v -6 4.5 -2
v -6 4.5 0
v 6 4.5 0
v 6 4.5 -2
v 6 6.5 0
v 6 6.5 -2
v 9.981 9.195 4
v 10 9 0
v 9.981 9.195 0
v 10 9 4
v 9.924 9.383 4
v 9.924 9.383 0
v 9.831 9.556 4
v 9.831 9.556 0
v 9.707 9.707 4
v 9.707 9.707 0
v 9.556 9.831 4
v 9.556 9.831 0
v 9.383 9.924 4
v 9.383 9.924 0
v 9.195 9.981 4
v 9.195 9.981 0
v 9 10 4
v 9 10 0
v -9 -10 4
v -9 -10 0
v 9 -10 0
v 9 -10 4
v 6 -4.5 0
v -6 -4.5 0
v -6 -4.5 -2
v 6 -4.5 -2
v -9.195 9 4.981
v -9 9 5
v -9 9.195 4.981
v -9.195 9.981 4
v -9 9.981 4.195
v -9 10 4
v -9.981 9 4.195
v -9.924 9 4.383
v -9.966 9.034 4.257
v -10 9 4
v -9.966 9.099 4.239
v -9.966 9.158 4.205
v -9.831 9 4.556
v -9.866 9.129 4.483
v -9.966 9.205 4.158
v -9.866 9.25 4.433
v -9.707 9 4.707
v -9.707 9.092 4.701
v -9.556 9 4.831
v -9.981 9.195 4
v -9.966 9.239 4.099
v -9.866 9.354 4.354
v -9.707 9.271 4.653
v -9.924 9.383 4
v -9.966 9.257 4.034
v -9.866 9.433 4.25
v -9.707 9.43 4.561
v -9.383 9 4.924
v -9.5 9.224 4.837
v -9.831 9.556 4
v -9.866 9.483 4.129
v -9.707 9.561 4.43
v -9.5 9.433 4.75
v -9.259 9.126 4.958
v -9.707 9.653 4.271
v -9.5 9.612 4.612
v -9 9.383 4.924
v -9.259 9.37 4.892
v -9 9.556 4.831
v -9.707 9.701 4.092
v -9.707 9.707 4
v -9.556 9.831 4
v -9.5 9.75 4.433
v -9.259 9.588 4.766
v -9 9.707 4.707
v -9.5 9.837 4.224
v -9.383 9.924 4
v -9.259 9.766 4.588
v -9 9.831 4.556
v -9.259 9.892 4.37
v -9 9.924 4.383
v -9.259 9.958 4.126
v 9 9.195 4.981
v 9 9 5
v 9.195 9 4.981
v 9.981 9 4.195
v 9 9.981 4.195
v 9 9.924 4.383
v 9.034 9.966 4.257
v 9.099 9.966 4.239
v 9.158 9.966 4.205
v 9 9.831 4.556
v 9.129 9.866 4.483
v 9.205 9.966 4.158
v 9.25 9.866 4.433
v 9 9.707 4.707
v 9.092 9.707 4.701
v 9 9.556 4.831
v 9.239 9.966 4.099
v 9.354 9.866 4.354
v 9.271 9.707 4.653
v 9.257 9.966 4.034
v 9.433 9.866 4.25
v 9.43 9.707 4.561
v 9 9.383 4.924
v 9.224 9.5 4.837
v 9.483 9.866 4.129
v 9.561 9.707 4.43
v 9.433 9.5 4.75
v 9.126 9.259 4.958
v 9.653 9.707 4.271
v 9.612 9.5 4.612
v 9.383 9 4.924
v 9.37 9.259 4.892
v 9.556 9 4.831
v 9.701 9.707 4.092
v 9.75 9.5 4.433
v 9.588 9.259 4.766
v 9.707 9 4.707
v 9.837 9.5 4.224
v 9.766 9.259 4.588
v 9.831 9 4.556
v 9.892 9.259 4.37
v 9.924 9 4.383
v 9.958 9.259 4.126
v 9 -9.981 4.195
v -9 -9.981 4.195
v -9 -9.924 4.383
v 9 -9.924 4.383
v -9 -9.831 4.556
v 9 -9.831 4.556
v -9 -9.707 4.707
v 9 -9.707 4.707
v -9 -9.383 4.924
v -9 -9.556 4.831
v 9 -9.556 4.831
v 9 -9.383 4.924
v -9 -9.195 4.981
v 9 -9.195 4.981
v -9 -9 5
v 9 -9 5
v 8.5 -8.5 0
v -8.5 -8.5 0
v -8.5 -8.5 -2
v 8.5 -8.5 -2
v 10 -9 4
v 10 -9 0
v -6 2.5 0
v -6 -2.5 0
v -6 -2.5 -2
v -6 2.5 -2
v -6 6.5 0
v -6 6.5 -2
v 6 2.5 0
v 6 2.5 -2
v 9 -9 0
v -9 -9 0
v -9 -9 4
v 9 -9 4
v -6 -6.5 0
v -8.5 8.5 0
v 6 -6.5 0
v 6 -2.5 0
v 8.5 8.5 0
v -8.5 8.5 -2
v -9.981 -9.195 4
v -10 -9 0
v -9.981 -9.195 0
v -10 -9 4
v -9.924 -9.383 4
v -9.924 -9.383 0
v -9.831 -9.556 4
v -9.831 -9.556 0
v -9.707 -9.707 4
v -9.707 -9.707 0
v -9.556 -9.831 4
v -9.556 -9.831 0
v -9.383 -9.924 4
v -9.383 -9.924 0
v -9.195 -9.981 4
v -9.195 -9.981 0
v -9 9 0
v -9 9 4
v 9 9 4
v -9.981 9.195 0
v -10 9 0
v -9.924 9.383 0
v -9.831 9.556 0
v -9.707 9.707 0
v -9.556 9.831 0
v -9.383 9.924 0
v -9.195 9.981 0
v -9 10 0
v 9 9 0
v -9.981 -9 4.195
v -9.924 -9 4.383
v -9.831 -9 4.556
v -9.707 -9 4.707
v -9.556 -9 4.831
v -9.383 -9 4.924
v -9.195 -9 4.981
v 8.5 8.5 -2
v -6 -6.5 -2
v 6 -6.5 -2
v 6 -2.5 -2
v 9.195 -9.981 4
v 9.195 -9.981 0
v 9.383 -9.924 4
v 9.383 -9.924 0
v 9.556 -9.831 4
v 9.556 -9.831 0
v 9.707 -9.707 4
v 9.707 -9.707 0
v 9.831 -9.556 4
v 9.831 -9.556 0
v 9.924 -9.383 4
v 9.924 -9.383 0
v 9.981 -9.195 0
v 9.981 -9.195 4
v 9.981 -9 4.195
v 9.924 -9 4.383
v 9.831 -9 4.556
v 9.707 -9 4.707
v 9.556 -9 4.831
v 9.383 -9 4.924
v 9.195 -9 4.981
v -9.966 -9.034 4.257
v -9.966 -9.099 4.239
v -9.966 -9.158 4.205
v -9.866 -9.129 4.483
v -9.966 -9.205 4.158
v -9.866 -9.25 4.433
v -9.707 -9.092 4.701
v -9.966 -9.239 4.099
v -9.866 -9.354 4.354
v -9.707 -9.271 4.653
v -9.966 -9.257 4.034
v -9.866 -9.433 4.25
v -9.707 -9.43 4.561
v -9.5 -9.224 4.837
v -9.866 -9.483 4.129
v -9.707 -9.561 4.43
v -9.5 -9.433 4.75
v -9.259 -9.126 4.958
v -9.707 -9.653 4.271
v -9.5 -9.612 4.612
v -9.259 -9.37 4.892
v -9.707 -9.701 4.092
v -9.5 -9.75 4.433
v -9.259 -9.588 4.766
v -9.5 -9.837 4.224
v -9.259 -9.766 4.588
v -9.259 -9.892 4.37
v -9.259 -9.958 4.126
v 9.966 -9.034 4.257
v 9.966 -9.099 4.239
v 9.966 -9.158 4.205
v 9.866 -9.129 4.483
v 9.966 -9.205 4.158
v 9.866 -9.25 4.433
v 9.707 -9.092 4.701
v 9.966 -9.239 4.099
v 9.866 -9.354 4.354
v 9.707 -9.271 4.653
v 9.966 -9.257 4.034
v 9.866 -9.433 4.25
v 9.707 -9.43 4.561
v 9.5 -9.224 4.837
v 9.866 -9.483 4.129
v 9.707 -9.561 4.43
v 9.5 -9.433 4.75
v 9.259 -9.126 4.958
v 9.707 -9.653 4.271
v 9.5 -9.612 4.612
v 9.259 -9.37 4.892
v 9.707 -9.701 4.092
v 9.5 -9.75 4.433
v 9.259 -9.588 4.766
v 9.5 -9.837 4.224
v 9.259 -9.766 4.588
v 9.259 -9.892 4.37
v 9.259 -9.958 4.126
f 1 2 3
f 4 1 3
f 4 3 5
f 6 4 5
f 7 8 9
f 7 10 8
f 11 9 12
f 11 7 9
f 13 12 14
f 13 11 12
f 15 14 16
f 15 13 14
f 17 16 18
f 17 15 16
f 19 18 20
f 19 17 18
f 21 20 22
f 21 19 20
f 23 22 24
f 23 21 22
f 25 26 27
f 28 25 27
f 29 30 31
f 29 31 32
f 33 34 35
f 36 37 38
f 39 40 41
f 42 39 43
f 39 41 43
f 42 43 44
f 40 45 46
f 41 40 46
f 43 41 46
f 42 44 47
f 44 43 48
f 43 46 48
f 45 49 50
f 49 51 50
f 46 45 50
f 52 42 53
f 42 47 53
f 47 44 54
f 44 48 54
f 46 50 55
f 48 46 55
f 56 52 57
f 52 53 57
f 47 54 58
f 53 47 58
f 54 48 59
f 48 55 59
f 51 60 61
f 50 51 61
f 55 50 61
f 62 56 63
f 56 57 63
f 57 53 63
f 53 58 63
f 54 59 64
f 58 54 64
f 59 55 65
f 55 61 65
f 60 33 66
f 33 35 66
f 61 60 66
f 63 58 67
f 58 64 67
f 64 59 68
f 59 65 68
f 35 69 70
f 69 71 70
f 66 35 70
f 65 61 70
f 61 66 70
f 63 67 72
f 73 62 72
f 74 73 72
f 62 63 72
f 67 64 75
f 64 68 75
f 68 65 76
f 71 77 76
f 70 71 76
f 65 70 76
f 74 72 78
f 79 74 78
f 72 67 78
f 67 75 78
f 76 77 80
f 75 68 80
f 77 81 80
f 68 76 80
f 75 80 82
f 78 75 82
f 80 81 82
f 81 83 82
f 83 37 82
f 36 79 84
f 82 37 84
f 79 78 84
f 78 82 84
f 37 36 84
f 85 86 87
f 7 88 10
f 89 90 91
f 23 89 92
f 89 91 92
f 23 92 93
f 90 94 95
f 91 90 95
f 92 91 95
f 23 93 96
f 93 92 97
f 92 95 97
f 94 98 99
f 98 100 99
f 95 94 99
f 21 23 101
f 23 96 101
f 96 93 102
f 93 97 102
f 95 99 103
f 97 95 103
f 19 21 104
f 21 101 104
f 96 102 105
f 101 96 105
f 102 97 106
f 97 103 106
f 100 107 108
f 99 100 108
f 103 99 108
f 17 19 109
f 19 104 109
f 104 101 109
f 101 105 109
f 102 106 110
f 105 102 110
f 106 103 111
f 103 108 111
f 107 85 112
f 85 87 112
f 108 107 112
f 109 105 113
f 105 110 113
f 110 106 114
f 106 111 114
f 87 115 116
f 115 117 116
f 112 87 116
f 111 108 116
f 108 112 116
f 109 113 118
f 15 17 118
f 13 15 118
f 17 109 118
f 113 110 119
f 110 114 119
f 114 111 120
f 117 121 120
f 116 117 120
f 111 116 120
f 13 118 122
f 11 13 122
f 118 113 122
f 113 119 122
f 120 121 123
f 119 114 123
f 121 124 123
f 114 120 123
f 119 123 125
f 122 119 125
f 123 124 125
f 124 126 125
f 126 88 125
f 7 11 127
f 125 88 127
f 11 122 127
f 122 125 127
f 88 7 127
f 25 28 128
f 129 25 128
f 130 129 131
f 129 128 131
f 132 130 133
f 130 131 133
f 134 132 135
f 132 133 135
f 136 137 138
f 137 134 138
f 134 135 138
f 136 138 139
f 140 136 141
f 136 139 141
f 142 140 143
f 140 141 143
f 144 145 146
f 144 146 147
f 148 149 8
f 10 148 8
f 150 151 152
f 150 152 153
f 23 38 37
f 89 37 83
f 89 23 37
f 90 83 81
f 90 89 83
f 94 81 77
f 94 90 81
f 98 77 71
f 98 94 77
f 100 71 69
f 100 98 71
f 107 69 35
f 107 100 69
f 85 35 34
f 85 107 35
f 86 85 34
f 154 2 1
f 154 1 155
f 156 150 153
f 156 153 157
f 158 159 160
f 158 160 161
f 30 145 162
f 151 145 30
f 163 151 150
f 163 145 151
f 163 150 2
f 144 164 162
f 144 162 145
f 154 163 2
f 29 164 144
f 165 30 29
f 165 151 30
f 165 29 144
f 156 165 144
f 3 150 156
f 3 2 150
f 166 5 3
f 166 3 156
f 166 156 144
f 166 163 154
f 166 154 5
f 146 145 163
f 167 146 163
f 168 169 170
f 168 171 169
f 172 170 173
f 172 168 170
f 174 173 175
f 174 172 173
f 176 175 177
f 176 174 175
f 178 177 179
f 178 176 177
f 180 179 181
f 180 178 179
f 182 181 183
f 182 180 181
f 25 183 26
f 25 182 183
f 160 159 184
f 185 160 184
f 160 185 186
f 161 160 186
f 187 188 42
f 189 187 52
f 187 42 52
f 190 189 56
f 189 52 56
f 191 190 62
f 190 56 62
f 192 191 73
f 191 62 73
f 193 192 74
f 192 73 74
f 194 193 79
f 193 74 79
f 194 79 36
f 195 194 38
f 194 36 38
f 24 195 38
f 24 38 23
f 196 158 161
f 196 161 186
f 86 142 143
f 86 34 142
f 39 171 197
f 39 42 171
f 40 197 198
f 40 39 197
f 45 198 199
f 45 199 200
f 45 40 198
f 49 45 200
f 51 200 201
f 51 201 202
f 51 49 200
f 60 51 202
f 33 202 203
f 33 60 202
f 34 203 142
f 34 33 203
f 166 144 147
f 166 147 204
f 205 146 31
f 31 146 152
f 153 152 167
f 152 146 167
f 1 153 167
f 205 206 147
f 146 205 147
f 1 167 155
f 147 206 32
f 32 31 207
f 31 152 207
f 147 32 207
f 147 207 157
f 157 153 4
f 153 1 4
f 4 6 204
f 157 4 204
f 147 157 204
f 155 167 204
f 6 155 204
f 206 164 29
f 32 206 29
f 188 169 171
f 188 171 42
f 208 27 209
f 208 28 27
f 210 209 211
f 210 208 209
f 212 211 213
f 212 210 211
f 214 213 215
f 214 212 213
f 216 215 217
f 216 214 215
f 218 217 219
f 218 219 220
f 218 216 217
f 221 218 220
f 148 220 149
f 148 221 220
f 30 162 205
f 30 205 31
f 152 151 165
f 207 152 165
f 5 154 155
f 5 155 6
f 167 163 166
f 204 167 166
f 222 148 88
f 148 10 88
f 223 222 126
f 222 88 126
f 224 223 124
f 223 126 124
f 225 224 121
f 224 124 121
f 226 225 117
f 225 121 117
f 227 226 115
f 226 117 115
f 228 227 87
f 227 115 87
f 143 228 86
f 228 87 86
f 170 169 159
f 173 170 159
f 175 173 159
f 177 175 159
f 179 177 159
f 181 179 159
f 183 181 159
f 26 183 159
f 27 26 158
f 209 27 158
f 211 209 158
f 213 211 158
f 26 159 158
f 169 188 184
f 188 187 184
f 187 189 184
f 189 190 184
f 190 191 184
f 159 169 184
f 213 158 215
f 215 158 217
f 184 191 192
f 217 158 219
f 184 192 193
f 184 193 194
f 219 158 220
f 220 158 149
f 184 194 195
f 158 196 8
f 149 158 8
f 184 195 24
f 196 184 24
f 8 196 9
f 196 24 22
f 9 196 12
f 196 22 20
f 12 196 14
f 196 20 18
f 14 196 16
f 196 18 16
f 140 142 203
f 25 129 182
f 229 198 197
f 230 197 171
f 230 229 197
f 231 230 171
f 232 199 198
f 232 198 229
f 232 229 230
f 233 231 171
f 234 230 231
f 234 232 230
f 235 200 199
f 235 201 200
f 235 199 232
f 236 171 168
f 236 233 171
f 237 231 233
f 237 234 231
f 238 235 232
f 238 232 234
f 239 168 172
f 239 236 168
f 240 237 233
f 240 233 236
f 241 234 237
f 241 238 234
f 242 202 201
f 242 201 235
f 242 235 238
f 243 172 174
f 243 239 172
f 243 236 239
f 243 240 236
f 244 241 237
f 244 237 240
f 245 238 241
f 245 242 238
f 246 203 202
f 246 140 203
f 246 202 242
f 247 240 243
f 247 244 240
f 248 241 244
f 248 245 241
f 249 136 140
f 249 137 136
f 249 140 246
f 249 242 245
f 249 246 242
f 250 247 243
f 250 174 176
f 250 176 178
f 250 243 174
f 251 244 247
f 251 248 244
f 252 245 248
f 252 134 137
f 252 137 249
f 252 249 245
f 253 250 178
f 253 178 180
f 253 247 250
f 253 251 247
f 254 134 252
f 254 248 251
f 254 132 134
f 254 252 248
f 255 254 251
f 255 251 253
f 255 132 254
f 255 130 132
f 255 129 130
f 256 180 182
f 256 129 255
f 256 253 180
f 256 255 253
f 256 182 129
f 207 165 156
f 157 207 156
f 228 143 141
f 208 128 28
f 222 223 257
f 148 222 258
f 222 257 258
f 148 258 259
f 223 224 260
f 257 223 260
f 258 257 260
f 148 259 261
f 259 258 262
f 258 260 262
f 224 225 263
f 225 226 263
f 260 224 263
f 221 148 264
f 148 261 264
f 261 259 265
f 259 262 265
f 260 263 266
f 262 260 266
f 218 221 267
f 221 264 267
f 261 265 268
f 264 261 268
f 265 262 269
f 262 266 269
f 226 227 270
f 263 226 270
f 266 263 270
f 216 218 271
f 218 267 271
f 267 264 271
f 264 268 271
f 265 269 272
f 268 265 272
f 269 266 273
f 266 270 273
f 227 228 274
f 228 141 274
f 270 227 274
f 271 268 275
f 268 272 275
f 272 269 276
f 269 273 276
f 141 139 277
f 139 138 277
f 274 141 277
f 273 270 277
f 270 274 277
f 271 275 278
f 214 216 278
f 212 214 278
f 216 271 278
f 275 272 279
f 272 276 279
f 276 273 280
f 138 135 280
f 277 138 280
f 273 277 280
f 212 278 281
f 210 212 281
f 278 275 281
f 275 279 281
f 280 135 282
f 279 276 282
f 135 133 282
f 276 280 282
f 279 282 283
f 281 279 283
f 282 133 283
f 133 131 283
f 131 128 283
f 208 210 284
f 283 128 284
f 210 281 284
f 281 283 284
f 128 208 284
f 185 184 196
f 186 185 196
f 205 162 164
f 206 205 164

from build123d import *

# Parameters (mm, degrees)
F0_W     = 20
F0_H     = 20
F1_DEPTH = 5
F2_T     = -1
F3_R     = 1
F4_W     = 17
F4_H     = 17
F4_W_2   = 12
F4_H_2   = 2
F4_H_3   = 5
F5_DEPTH = 2


with BuildPart() as f1:
    # F0 (on Top) → F1 (new body)
    with BuildSketch(Plane.XY):
        Rectangle(F0_W, F0_H)
    extrude(amount=F1_DEPTH)

    # F2
    f2_openings = [f1.faces().sort_by_distance(p)[0] for p in [
        (0, 0, 0),
    ]]
    offset(amount=F2_T, openings=f2_openings)

    # F3
    f3_edges = [f1.edges().sort_by_distance(p)[0] for p in [
        (0, -10, 5),
        (10, 0, 5),
        (0, 10, 5),
        (-10, 0, 5),
        (-10, -10, 2.5),
        (10, -10, 2.5),
        (10, 10, 2.5),
        (-10, 10, 2.5),
    ]]
    fillet(f3_edges, radius=F3_R)


with BuildPart() as f5:
    # F4 (on Top) → F5 (new body)
    with BuildSketch(Plane.XY):
        Rectangle(F4_W, F4_H)
        with Locations((0, -5.5)):
            Rectangle(F4_W_2, F4_H_2, mode=Mode.SUBTRACT)
        Rectangle(F4_W_2, F4_H_3, mode=Mode.SUBTRACT)
        with Locations((0, 5.5)):
            Rectangle(F4_W_2, F4_H_2, mode=Mode.SUBTRACT)
    extrude(amount=-F5_DEPTH)


solid = Compound([f1.part, f5.part])
